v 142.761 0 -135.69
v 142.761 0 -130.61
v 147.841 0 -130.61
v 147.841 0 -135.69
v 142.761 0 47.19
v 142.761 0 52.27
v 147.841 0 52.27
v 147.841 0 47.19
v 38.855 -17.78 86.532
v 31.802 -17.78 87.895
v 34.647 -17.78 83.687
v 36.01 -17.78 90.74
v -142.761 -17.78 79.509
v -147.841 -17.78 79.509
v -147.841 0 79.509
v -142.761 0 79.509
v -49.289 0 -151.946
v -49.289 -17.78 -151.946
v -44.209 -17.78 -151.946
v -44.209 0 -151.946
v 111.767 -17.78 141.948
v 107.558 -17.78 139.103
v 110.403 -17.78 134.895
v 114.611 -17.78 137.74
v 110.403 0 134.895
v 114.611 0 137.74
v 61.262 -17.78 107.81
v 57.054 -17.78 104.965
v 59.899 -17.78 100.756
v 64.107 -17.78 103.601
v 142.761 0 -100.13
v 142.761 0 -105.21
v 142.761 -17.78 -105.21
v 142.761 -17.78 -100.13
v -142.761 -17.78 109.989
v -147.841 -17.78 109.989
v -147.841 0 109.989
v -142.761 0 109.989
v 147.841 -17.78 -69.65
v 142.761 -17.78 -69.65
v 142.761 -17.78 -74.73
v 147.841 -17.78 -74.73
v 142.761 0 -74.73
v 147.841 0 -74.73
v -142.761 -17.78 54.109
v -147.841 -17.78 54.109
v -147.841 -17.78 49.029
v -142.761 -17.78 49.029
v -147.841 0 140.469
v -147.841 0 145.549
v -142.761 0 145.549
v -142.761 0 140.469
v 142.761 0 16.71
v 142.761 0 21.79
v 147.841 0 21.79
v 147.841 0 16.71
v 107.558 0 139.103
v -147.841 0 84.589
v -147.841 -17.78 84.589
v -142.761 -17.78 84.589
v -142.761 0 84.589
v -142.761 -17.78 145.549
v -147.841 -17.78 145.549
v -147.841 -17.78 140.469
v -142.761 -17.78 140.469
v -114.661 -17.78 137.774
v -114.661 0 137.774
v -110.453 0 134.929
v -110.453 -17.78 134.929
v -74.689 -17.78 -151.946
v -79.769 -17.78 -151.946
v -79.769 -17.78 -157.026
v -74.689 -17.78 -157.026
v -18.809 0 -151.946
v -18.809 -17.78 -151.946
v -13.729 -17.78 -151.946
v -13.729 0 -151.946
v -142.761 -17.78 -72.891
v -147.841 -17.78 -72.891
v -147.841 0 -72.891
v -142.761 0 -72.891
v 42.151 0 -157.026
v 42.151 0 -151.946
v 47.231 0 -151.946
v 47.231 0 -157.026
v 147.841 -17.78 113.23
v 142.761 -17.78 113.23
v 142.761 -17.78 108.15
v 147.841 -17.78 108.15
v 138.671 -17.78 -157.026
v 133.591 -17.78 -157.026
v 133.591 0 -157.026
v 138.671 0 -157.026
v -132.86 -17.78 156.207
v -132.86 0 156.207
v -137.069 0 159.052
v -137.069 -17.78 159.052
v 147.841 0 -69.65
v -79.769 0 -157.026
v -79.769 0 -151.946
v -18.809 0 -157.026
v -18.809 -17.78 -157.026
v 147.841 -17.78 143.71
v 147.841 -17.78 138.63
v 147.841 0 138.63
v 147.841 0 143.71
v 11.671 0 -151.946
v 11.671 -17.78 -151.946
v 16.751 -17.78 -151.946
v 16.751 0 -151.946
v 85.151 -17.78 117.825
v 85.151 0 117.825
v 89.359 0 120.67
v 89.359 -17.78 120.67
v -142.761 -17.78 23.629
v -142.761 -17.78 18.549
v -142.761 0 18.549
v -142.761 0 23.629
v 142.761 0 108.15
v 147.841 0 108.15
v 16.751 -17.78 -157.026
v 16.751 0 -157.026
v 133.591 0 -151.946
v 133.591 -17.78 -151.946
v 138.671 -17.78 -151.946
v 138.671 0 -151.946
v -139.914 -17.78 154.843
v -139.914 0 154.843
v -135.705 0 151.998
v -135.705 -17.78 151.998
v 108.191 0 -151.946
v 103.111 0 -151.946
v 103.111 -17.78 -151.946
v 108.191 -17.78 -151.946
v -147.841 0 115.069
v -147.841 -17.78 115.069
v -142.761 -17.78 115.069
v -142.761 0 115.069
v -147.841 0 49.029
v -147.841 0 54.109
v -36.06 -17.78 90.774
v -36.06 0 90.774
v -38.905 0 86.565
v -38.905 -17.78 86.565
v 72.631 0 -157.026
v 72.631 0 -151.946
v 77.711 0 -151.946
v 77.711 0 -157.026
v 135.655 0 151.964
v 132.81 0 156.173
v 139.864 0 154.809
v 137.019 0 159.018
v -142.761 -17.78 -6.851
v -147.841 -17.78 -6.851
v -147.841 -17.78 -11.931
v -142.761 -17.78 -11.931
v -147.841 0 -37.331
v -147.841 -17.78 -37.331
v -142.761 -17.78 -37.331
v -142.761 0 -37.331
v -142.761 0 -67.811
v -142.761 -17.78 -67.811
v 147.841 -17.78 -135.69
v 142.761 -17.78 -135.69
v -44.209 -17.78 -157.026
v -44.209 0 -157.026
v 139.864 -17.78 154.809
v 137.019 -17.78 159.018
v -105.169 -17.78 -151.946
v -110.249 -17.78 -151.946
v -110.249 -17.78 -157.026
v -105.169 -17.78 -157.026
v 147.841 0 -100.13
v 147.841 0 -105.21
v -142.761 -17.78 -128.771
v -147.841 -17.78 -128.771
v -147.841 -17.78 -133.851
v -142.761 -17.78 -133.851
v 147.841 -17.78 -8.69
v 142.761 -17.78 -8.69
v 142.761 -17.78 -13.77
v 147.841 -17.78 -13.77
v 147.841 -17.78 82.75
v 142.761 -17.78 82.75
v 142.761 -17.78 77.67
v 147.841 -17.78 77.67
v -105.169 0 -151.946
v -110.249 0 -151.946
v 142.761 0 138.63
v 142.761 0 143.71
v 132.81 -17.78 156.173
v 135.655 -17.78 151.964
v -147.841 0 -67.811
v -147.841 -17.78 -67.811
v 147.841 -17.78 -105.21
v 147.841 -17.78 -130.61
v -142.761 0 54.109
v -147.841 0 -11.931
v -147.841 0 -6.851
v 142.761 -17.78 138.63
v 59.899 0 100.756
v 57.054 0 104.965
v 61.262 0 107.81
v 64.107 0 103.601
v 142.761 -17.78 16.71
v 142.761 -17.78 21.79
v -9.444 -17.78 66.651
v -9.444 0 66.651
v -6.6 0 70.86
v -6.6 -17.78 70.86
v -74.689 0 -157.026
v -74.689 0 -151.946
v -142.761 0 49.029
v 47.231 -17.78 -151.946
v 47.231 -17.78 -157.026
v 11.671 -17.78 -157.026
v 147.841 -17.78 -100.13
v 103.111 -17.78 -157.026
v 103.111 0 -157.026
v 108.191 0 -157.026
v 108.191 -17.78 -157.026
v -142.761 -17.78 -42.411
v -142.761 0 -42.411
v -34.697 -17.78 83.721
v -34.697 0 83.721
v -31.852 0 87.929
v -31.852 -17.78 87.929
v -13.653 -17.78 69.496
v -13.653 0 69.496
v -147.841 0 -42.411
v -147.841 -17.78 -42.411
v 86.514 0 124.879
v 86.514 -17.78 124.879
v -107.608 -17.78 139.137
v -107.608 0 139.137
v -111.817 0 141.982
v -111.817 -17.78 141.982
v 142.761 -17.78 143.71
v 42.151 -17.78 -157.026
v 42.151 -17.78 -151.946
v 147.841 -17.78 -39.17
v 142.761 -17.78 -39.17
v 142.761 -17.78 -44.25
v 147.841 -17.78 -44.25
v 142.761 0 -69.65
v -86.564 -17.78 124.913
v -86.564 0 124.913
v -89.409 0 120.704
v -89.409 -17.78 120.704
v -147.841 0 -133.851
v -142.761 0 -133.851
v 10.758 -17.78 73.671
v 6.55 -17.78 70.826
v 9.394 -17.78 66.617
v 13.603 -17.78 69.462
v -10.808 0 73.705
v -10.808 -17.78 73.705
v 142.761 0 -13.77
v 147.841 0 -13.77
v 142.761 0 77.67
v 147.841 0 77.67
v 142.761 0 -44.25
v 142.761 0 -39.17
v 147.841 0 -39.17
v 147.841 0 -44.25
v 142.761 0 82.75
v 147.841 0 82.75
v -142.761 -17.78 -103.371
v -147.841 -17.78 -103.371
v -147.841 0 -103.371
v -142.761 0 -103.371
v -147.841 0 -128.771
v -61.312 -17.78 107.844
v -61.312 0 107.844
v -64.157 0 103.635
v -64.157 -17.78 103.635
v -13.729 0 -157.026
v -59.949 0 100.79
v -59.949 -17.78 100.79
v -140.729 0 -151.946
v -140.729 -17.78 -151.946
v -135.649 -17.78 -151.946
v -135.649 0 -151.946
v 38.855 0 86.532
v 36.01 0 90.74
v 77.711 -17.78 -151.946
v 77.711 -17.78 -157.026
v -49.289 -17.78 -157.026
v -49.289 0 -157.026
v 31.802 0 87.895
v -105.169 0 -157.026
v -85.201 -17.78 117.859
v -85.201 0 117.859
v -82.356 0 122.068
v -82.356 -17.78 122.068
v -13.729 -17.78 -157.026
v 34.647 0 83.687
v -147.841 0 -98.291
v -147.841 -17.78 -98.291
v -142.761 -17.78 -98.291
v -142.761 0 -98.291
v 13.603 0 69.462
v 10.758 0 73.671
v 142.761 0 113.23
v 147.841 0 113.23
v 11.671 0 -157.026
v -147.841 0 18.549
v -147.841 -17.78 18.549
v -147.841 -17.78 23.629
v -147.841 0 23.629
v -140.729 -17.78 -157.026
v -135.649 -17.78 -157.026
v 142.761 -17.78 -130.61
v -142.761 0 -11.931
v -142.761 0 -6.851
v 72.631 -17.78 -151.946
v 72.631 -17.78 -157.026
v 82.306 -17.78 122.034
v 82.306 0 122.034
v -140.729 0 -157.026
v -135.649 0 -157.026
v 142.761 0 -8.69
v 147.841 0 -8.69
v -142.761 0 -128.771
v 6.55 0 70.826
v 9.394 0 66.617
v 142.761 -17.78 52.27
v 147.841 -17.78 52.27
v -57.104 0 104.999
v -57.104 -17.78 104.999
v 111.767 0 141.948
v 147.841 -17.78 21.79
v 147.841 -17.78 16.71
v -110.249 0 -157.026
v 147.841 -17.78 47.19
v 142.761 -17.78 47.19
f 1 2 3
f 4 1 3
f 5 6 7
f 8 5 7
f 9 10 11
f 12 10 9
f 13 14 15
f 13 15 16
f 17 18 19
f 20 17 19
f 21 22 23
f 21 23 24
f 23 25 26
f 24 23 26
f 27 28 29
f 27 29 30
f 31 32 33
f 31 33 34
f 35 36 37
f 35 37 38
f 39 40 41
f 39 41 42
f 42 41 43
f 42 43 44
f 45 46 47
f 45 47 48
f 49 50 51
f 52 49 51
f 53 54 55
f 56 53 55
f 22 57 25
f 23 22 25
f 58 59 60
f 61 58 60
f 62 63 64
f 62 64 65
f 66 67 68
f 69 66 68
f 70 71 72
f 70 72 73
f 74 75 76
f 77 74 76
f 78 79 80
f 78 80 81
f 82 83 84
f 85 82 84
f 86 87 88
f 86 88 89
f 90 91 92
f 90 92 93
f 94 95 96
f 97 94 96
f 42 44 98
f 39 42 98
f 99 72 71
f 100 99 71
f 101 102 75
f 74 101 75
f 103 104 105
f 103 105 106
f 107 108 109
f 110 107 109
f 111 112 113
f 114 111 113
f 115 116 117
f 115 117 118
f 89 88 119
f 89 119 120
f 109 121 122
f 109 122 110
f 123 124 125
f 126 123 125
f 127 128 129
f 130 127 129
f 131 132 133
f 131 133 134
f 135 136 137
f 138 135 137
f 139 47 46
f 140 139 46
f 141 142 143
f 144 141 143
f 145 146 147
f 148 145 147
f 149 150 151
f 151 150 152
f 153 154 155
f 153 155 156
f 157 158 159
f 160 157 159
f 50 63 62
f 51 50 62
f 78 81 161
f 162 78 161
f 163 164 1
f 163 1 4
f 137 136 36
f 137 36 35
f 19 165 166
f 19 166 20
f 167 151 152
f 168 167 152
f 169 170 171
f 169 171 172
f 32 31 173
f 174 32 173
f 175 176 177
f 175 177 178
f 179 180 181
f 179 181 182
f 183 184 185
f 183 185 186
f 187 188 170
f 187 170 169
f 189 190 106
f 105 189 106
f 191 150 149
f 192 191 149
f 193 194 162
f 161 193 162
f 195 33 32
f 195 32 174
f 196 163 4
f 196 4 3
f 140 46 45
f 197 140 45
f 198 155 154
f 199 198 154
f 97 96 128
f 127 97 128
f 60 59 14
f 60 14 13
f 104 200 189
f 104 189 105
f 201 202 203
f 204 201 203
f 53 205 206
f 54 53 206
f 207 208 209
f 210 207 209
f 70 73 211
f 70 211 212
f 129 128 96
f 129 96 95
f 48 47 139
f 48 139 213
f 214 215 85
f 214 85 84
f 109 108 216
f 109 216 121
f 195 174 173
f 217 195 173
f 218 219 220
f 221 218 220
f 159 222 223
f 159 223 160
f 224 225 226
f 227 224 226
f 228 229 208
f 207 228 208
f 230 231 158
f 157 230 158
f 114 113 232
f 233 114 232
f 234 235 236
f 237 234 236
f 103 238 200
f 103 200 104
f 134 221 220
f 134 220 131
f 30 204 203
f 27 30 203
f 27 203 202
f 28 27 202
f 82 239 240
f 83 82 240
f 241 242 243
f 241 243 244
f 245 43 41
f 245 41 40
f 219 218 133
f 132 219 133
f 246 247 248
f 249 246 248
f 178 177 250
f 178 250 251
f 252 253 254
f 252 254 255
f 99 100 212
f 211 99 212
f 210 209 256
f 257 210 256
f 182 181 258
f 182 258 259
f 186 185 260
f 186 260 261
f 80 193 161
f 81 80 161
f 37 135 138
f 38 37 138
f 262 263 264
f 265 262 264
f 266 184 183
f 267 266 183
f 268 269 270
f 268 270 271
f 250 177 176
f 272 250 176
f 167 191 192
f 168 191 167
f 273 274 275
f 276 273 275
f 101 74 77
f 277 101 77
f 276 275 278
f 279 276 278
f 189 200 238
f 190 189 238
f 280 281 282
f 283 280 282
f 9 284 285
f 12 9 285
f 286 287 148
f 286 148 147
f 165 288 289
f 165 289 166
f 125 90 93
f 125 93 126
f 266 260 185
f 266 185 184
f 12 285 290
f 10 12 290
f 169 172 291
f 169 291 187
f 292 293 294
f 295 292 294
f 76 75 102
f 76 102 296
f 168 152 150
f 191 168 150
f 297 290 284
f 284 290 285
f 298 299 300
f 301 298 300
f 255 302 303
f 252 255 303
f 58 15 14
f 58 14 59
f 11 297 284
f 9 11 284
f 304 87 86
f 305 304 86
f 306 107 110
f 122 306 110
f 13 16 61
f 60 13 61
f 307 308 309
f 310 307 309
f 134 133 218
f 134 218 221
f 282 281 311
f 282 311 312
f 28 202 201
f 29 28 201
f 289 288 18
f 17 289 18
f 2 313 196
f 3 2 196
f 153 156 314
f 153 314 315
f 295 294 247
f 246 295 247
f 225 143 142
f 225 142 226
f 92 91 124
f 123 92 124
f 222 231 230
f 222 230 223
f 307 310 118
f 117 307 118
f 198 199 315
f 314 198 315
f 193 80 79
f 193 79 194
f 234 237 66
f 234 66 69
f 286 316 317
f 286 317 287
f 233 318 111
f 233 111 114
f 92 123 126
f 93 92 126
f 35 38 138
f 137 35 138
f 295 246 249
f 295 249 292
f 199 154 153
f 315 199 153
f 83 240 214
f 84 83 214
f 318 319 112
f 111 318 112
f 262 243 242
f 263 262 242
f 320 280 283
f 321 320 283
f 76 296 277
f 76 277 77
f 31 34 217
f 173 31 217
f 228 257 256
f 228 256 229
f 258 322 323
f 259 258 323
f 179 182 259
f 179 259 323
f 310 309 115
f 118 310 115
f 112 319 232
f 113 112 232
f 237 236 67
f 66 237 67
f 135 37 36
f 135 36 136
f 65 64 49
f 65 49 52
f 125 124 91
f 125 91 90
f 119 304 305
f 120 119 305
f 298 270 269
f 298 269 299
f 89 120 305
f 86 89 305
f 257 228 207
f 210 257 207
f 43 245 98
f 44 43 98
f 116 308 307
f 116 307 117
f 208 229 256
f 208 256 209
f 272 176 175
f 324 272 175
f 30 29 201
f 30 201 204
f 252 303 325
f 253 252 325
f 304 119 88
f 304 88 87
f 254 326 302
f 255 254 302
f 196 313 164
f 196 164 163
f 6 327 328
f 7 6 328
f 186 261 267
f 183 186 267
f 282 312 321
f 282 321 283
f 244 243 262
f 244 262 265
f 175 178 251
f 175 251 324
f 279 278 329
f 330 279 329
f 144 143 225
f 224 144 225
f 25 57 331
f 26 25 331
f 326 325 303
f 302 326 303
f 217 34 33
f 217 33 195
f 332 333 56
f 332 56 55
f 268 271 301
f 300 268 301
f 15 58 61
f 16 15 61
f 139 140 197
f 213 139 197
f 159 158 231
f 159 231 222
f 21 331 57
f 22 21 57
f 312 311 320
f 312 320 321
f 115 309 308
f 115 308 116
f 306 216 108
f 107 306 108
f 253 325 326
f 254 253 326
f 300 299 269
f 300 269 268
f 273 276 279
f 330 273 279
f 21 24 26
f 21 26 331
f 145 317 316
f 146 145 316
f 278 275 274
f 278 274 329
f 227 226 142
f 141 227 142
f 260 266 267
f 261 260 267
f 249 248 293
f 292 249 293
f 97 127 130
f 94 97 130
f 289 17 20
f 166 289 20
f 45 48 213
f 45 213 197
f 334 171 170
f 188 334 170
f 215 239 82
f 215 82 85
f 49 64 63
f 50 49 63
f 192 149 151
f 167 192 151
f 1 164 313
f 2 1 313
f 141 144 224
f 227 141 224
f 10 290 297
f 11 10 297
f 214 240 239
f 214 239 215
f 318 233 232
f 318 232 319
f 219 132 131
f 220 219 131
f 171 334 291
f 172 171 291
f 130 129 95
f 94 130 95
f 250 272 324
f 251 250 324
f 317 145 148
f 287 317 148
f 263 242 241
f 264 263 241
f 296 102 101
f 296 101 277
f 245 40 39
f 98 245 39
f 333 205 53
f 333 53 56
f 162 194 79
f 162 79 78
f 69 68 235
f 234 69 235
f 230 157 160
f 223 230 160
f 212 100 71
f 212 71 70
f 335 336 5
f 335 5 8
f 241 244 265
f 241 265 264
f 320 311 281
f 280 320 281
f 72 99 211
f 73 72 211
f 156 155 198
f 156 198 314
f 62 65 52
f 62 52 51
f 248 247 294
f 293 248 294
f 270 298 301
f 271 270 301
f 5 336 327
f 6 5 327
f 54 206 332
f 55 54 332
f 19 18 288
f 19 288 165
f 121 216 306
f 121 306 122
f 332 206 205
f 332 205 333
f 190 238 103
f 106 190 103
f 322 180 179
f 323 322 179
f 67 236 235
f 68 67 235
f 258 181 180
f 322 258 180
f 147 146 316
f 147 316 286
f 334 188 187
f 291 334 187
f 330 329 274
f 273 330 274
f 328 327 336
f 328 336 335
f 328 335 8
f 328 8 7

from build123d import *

# Parameters (mm, degrees)
F1_W     = 5.08
F1_H     = 5.08
F2_DEPTH = 17.78


with BuildPart() as f2:
    # F1 (on Front) → F2 (new body)
    with BuildSketch(Plane.XZ):
        Polygon((-9.444466, 66.651233), (-6.599574, 70.859913), (-10.808254, 73.704805), (-13.653146, 69.496125), align=None)
        Polygon((-34.696548, 83.720584), (-31.851656, 87.929265), (-36.060336, 90.774156), (-38.905228, 86.565476), align=None)
        Polygon((-59.94863, 100.789935), (-57.103738, 104.998616), (-61.312418, 107.843507), (-64.15731, 103.634827), align=None)
        Polygon((-85.200712, 117.859286), (-82.35582, 122.067967), (-86.5645, 124.912859), (-89.409392, 120.704178), align=None)
        Polygon((-110.452794, 134.928637), (-107.607902, 139.137318), (-111.816583, 141.98221), (-114.661474, 137.773529), align=None)
        Polygon((-135.704876, 151.997989), (-132.859984, 156.206669), (-137.068665, 159.051561), (-139.913557, 154.84288), align=None)
        with Locations((-145.301461, -9.391267)):
            Rectangle(F1_W, F1_H)
        with Locations((-145.301461, 21.088733)):
            Rectangle(F1_W, F1_H)
        with Locations((-145.301461, 51.568733)):
            Rectangle(F1_W, F1_H)
        with Locations((-145.301461, 82.048733)):
            Rectangle(F1_W, F1_H)
        with Locations((-145.301461, 112.528733)):
            Rectangle(F1_W, F1_H)
        with Locations((-145.301461, 143.008733)):
            Rectangle(F1_W, F1_H)
        with Locations((-145.301461, -131.311267)):
            Rectangle(F1_W, F1_H)
        with Locations((-145.301461, -100.831267)):
            Rectangle(F1_W, F1_H)
        with Locations((-145.301461, -70.351267)):
            Rectangle(F1_W, F1_H)
        with Locations((-145.301461, -39.871267)):
            Rectangle(F1_W, F1_H)
        with Locations((-16.269461, -154.485834)):
            Rectangle(F1_W, F1_H)
        with Locations((14.210539, -154.485834)):
            Rectangle(F1_W, F1_H)
        with Locations((44.690539, -154.485834)):
            Rectangle(F1_W, F1_H)
        with Locations((75.170539, -154.485834)):
            Rectangle(F1_W, F1_H)
        with Locations((105.650539, -154.485834)):
            Rectangle(F1_W, F1_H)
        with Locations((-138.189461, -154.485834)):
            Rectangle(F1_W, F1_H)
        with Locations((-107.709461, -154.485834)):
            Rectangle(F1_W, F1_H)
        with Locations((-77.229461, -154.485834)):
            Rectangle(F1_W, F1_H)
        with Locations((-46.749461, -154.485834)):
            Rectangle(F1_W, F1_H)
        with Locations((136.130539, -154.485834)):
            Rectangle(F1_W, F1_H)
        with Locations((145.301461, -11.229834)):
            Rectangle(F1_W, F1_H)
        with Locations((145.301461, 19.250166)):
            Rectangle(F1_W, F1_H)
        with Locations((145.301461, 49.730166)):
            Rectangle(F1_W, F1_H)
        with Locations((145.301461, 80.210166)):
            Rectangle(F1_W, F1_H)
        with Locations((145.301461, 110.690166)):
            Rectangle(F1_W, F1_H)
        with Locations((145.301461, 141.170166)):
            Rectangle(F1_W, F1_H)
        with Locations((145.301461, -133.149834)):
            Rectangle(F1_W, F1_H)
        with Locations((145.301461, -102.669834)):
            Rectangle(F1_W, F1_H)
        with Locations((145.301461, -72.189834)):
            Rectangle(F1_W, F1_H)
        with Locations((145.301461, -41.709834)):
            Rectangle(F1_W, F1_H)
        Polygon((6.549541, 70.826094), (9.394433, 66.617413), (13.603114, 69.462305), (10.758222, 73.670986), align=None)
        Polygon((31.801624, 87.895445), (34.646515, 83.686764), (38.855196, 86.531656), (36.010304, 90.740337), align=None)
        Polygon((57.053706, 104.964796), (59.898598, 100.756116), (64.107278, 103.601007), (61.262386, 107.809688), align=None)
        Polygon((82.305788, 122.034147), (85.15068, 117.825467), (89.35936, 120.670358), (86.514468, 124.879039), align=None)
        Polygon((107.55787, 139.103498), (110.402762, 134.894818), (114.611442, 137.73971), (111.76655, 141.94839), align=None)
        Polygon((132.809952, 156.172849), (135.654844, 151.964169), (139.863524, 154.809061), (137.018633, 159.017741), align=None)
    extrude(amount=F2_DEPTH)


solid = f2.part
